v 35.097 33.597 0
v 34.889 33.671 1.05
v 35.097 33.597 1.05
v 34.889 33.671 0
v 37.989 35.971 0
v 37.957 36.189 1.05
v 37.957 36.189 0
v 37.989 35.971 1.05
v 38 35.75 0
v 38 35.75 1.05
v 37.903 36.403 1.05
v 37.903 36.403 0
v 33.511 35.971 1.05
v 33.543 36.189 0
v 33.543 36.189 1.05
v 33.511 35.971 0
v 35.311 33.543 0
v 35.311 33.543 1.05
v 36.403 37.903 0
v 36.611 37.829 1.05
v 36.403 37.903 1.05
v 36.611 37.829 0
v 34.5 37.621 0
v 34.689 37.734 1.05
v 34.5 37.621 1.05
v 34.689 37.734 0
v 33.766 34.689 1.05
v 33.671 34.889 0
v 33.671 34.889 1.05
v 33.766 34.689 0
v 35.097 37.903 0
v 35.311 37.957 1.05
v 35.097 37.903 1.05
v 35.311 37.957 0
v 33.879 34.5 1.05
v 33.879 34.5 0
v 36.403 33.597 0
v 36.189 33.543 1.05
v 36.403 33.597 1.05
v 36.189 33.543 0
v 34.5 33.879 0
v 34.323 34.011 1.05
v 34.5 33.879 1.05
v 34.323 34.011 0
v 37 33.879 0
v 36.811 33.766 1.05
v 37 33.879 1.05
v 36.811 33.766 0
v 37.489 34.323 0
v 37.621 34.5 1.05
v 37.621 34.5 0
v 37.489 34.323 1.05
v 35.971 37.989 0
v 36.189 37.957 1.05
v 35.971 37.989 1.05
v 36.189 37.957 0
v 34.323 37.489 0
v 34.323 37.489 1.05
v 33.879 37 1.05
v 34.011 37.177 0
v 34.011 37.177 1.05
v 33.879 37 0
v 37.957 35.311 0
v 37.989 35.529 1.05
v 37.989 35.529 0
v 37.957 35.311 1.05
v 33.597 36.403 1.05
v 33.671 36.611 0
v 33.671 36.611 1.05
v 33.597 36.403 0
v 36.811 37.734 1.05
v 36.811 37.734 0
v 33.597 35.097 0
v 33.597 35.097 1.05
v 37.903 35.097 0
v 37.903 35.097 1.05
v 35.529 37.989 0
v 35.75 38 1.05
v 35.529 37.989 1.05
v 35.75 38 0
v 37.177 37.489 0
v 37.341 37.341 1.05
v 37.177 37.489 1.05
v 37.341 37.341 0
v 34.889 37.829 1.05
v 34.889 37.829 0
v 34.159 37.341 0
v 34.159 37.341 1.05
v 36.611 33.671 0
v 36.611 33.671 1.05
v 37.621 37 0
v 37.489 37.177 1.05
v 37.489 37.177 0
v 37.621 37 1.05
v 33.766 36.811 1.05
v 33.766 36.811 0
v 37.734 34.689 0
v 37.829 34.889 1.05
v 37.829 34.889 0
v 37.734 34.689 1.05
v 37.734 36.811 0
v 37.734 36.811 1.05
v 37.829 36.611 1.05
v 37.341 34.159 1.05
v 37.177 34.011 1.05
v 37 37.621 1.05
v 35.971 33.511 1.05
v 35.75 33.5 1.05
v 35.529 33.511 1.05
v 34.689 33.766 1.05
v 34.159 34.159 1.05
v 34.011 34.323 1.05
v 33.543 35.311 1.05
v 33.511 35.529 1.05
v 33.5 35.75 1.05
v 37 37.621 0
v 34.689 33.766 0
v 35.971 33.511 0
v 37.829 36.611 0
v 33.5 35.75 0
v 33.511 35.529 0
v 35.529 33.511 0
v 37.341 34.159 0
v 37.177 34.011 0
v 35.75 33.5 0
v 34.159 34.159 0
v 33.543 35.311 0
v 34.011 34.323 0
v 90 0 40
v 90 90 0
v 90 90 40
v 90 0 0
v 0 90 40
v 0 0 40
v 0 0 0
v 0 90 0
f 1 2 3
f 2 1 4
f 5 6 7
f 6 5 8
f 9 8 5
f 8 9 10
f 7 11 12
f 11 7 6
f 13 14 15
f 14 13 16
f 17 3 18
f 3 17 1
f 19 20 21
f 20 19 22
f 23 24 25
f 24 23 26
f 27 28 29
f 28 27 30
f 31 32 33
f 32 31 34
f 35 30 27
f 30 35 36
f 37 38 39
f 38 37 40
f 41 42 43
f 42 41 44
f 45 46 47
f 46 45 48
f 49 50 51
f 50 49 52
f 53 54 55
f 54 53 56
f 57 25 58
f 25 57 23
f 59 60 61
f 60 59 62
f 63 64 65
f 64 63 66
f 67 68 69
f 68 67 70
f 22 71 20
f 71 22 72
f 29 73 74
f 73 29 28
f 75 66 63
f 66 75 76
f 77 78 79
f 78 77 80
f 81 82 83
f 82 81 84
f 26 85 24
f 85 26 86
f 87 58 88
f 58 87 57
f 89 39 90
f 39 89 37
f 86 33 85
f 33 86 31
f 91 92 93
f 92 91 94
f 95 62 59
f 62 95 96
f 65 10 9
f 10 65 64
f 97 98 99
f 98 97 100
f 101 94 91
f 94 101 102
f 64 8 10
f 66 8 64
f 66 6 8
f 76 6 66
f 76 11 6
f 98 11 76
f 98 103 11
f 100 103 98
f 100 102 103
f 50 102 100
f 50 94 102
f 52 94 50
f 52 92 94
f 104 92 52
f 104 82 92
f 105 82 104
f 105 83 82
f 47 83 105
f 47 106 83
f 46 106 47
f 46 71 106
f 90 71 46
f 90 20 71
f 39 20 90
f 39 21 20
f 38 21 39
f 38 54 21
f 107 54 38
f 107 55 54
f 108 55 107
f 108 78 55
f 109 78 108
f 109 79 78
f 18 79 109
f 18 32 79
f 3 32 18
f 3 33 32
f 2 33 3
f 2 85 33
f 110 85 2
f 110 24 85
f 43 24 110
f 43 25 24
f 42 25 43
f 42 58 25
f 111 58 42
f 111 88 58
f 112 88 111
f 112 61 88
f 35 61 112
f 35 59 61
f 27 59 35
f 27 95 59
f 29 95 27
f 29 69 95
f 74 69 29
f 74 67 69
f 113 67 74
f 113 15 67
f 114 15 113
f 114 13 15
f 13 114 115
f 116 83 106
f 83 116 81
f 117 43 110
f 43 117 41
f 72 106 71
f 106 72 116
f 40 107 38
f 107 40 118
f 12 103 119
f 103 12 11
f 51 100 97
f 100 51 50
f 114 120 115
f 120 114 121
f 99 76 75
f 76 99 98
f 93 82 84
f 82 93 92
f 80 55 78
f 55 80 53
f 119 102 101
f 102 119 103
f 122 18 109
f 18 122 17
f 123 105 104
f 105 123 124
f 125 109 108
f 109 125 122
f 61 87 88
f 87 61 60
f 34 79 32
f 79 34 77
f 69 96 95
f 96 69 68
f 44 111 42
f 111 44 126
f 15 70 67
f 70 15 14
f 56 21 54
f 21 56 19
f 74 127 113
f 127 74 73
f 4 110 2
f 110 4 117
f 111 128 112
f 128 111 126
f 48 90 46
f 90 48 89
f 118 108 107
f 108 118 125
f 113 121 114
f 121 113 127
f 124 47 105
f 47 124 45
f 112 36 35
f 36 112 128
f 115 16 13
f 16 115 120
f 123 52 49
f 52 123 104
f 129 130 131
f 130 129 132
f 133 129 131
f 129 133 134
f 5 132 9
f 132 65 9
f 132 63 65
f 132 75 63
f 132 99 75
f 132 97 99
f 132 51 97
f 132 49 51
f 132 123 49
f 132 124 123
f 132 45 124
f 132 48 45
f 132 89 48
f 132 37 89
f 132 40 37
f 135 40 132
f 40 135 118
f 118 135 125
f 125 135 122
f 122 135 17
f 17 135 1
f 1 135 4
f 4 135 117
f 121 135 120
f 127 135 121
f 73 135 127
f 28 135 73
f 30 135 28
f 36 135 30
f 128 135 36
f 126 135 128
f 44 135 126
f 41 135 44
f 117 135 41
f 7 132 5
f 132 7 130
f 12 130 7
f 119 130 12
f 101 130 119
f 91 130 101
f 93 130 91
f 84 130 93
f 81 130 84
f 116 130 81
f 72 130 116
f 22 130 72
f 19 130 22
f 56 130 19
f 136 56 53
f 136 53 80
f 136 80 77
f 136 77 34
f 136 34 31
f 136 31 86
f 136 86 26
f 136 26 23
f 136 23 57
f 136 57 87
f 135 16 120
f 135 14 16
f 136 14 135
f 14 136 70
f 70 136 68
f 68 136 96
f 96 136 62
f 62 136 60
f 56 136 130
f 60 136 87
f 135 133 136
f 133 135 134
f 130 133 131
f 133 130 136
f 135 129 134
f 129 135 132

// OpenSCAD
// DIY Magnetic Stirrer Housing for 80mm PC Fan
// Print Orientation: Upside down (Top plate on bed)
// Units: mm

// --- Dimensions ---
// Outer footprint of the housing
W_OUT = 90;
H_OUT = 90;

// Thickness of the top plate (bottom of the box in print orientation)
THICK_TOP = 2;

// Height of the walls
H_WALL = 38; // Total height 40mm - 2mm top plate

// Wall thickness
THICK_WALL = 2.5;

// Fan mounting hole diameter (M4 clearance)
D_FAN_HOLE = 4.5;

// Fan mounting hole pattern: 71.5mm square, centred
PATTERN_SIZE = 71.5;

// Cable notch dimensions
NOTCH_W = 12;
NOTCH_H = 8; // Depth from open edge (z=40) down to z=32

// Resolution for curved features
$fn = 64;

// --- Helper: Create the main box block ---
module stirrer_housing() {
    // We build the box as a single solid using difference to cut holes and notches
    // Base block: Outer dimensions, total height (top plate + walls)
    h_total = THICK_TOP + H_WALL;
    
    difference() {
        // 1. Main Block
        // Outer size: W_OUT x H_OUT
        // Height: h_total
        translate([0, 0, 0])
            cube([W_OUT, H_OUT, h_total], center = false);
        
        // 2. Cut Fan Mounting Holes through the top plate
        // Pattern: 71.5mm square centred on the 90x90 plate
        // Hole centers: (71.5/2, 71.5/2), (71.5/2, -71.5/2), (-71.5/2, 71.5/2), (-71.5/2, -71.5/2)
        // Z range: 0 to THICK_TOP (2mm)
        
        for (i = [0, 1]) {
            for (j = [0, 1]) {
                // Calculate offset for the 4 corners of the square pattern
                // i=0, j=0 -> -X, -Y
                // i=0, j=1 -> -X, +Y
                // i=1, j=0 -> +X, -Y
                // i=1, j=1 -> +X, +Y
                x_off = (i == 0) ? (-PATTERN_SIZE/2) : (PATTERN_SIZE/2);
                y_off = (j == 0) ? (-PATTERN_SIZE/2) : (PATTERN_SIZE/2);
                
                translate([x_off, y_off, 0])
                    cylinder(
                        h = THICK_TOP + 0.1, // Extend slightly past top plate to ensure clean cut
                        r = D_FAN_HOLE/2,
                        center = true
                    );
            }
        }
        
        // 3. Cut Cable Notch
        // Location: One wall. Let's choose the wall at X = -W_OUT/2 (Left wall).
        // Width: 12mm. Centred along the wall (Y direction).
        // Depth: 8mm from the open edge (z=40) down to z=32.
        // Open edge is at z = THICK_TOP + H_WALL = 40.
        // Notch goes from z = 40 - 8 = 32 to z = 40.
        
        // Wall center X: -45
        // Wall center Y: 0
        // Notch width: 12
        // Notch height: 8
        
        translate([-W_OUT/2, 0, 0]) {
            // Create a box that cuts into the wall
            // The notch is a void. We define a box of size [W, H, D]
            // W = NOTCH_W (12)
            // H = NOTCH_H (8)
            // D = THICK_WALL (2.5) - extending slightly past the wall thickness to ensure clean cut
            
            // Position:
            // X: Centered on the wall face. The wall face is at X = -45.
            // The notch width is 12. So it spans from -45 - 6 to -45 + 6.
            // Y: Centered on the wall. Wall height is 90. Center is 0.
            // Z: From 32 to 40.
            
            // To cut correctly in difference(), the cutting object must exist where the hole is.
            // We define a block that represents the "missing material".
            
            translate([
                -W_OUT/2 - NOTCH_W/2, // X start of notch
                -NOTCH_H/2,           // Y center (0)
                32                    // Z start of notch
            ])
                cube([
                    NOTCH_W,          // Width 12
                    H_OUT,            // Height 90 (must cover full wall height)
                    NOTCH_H + 0.1     // Depth 8 + epsilon to cut through wall thickness
                ]);
        }
    }
}

// --- Main Assembly ---
// Center the part on the origin as requested
translate([0, 0, 0])
    stirrer_housing();
